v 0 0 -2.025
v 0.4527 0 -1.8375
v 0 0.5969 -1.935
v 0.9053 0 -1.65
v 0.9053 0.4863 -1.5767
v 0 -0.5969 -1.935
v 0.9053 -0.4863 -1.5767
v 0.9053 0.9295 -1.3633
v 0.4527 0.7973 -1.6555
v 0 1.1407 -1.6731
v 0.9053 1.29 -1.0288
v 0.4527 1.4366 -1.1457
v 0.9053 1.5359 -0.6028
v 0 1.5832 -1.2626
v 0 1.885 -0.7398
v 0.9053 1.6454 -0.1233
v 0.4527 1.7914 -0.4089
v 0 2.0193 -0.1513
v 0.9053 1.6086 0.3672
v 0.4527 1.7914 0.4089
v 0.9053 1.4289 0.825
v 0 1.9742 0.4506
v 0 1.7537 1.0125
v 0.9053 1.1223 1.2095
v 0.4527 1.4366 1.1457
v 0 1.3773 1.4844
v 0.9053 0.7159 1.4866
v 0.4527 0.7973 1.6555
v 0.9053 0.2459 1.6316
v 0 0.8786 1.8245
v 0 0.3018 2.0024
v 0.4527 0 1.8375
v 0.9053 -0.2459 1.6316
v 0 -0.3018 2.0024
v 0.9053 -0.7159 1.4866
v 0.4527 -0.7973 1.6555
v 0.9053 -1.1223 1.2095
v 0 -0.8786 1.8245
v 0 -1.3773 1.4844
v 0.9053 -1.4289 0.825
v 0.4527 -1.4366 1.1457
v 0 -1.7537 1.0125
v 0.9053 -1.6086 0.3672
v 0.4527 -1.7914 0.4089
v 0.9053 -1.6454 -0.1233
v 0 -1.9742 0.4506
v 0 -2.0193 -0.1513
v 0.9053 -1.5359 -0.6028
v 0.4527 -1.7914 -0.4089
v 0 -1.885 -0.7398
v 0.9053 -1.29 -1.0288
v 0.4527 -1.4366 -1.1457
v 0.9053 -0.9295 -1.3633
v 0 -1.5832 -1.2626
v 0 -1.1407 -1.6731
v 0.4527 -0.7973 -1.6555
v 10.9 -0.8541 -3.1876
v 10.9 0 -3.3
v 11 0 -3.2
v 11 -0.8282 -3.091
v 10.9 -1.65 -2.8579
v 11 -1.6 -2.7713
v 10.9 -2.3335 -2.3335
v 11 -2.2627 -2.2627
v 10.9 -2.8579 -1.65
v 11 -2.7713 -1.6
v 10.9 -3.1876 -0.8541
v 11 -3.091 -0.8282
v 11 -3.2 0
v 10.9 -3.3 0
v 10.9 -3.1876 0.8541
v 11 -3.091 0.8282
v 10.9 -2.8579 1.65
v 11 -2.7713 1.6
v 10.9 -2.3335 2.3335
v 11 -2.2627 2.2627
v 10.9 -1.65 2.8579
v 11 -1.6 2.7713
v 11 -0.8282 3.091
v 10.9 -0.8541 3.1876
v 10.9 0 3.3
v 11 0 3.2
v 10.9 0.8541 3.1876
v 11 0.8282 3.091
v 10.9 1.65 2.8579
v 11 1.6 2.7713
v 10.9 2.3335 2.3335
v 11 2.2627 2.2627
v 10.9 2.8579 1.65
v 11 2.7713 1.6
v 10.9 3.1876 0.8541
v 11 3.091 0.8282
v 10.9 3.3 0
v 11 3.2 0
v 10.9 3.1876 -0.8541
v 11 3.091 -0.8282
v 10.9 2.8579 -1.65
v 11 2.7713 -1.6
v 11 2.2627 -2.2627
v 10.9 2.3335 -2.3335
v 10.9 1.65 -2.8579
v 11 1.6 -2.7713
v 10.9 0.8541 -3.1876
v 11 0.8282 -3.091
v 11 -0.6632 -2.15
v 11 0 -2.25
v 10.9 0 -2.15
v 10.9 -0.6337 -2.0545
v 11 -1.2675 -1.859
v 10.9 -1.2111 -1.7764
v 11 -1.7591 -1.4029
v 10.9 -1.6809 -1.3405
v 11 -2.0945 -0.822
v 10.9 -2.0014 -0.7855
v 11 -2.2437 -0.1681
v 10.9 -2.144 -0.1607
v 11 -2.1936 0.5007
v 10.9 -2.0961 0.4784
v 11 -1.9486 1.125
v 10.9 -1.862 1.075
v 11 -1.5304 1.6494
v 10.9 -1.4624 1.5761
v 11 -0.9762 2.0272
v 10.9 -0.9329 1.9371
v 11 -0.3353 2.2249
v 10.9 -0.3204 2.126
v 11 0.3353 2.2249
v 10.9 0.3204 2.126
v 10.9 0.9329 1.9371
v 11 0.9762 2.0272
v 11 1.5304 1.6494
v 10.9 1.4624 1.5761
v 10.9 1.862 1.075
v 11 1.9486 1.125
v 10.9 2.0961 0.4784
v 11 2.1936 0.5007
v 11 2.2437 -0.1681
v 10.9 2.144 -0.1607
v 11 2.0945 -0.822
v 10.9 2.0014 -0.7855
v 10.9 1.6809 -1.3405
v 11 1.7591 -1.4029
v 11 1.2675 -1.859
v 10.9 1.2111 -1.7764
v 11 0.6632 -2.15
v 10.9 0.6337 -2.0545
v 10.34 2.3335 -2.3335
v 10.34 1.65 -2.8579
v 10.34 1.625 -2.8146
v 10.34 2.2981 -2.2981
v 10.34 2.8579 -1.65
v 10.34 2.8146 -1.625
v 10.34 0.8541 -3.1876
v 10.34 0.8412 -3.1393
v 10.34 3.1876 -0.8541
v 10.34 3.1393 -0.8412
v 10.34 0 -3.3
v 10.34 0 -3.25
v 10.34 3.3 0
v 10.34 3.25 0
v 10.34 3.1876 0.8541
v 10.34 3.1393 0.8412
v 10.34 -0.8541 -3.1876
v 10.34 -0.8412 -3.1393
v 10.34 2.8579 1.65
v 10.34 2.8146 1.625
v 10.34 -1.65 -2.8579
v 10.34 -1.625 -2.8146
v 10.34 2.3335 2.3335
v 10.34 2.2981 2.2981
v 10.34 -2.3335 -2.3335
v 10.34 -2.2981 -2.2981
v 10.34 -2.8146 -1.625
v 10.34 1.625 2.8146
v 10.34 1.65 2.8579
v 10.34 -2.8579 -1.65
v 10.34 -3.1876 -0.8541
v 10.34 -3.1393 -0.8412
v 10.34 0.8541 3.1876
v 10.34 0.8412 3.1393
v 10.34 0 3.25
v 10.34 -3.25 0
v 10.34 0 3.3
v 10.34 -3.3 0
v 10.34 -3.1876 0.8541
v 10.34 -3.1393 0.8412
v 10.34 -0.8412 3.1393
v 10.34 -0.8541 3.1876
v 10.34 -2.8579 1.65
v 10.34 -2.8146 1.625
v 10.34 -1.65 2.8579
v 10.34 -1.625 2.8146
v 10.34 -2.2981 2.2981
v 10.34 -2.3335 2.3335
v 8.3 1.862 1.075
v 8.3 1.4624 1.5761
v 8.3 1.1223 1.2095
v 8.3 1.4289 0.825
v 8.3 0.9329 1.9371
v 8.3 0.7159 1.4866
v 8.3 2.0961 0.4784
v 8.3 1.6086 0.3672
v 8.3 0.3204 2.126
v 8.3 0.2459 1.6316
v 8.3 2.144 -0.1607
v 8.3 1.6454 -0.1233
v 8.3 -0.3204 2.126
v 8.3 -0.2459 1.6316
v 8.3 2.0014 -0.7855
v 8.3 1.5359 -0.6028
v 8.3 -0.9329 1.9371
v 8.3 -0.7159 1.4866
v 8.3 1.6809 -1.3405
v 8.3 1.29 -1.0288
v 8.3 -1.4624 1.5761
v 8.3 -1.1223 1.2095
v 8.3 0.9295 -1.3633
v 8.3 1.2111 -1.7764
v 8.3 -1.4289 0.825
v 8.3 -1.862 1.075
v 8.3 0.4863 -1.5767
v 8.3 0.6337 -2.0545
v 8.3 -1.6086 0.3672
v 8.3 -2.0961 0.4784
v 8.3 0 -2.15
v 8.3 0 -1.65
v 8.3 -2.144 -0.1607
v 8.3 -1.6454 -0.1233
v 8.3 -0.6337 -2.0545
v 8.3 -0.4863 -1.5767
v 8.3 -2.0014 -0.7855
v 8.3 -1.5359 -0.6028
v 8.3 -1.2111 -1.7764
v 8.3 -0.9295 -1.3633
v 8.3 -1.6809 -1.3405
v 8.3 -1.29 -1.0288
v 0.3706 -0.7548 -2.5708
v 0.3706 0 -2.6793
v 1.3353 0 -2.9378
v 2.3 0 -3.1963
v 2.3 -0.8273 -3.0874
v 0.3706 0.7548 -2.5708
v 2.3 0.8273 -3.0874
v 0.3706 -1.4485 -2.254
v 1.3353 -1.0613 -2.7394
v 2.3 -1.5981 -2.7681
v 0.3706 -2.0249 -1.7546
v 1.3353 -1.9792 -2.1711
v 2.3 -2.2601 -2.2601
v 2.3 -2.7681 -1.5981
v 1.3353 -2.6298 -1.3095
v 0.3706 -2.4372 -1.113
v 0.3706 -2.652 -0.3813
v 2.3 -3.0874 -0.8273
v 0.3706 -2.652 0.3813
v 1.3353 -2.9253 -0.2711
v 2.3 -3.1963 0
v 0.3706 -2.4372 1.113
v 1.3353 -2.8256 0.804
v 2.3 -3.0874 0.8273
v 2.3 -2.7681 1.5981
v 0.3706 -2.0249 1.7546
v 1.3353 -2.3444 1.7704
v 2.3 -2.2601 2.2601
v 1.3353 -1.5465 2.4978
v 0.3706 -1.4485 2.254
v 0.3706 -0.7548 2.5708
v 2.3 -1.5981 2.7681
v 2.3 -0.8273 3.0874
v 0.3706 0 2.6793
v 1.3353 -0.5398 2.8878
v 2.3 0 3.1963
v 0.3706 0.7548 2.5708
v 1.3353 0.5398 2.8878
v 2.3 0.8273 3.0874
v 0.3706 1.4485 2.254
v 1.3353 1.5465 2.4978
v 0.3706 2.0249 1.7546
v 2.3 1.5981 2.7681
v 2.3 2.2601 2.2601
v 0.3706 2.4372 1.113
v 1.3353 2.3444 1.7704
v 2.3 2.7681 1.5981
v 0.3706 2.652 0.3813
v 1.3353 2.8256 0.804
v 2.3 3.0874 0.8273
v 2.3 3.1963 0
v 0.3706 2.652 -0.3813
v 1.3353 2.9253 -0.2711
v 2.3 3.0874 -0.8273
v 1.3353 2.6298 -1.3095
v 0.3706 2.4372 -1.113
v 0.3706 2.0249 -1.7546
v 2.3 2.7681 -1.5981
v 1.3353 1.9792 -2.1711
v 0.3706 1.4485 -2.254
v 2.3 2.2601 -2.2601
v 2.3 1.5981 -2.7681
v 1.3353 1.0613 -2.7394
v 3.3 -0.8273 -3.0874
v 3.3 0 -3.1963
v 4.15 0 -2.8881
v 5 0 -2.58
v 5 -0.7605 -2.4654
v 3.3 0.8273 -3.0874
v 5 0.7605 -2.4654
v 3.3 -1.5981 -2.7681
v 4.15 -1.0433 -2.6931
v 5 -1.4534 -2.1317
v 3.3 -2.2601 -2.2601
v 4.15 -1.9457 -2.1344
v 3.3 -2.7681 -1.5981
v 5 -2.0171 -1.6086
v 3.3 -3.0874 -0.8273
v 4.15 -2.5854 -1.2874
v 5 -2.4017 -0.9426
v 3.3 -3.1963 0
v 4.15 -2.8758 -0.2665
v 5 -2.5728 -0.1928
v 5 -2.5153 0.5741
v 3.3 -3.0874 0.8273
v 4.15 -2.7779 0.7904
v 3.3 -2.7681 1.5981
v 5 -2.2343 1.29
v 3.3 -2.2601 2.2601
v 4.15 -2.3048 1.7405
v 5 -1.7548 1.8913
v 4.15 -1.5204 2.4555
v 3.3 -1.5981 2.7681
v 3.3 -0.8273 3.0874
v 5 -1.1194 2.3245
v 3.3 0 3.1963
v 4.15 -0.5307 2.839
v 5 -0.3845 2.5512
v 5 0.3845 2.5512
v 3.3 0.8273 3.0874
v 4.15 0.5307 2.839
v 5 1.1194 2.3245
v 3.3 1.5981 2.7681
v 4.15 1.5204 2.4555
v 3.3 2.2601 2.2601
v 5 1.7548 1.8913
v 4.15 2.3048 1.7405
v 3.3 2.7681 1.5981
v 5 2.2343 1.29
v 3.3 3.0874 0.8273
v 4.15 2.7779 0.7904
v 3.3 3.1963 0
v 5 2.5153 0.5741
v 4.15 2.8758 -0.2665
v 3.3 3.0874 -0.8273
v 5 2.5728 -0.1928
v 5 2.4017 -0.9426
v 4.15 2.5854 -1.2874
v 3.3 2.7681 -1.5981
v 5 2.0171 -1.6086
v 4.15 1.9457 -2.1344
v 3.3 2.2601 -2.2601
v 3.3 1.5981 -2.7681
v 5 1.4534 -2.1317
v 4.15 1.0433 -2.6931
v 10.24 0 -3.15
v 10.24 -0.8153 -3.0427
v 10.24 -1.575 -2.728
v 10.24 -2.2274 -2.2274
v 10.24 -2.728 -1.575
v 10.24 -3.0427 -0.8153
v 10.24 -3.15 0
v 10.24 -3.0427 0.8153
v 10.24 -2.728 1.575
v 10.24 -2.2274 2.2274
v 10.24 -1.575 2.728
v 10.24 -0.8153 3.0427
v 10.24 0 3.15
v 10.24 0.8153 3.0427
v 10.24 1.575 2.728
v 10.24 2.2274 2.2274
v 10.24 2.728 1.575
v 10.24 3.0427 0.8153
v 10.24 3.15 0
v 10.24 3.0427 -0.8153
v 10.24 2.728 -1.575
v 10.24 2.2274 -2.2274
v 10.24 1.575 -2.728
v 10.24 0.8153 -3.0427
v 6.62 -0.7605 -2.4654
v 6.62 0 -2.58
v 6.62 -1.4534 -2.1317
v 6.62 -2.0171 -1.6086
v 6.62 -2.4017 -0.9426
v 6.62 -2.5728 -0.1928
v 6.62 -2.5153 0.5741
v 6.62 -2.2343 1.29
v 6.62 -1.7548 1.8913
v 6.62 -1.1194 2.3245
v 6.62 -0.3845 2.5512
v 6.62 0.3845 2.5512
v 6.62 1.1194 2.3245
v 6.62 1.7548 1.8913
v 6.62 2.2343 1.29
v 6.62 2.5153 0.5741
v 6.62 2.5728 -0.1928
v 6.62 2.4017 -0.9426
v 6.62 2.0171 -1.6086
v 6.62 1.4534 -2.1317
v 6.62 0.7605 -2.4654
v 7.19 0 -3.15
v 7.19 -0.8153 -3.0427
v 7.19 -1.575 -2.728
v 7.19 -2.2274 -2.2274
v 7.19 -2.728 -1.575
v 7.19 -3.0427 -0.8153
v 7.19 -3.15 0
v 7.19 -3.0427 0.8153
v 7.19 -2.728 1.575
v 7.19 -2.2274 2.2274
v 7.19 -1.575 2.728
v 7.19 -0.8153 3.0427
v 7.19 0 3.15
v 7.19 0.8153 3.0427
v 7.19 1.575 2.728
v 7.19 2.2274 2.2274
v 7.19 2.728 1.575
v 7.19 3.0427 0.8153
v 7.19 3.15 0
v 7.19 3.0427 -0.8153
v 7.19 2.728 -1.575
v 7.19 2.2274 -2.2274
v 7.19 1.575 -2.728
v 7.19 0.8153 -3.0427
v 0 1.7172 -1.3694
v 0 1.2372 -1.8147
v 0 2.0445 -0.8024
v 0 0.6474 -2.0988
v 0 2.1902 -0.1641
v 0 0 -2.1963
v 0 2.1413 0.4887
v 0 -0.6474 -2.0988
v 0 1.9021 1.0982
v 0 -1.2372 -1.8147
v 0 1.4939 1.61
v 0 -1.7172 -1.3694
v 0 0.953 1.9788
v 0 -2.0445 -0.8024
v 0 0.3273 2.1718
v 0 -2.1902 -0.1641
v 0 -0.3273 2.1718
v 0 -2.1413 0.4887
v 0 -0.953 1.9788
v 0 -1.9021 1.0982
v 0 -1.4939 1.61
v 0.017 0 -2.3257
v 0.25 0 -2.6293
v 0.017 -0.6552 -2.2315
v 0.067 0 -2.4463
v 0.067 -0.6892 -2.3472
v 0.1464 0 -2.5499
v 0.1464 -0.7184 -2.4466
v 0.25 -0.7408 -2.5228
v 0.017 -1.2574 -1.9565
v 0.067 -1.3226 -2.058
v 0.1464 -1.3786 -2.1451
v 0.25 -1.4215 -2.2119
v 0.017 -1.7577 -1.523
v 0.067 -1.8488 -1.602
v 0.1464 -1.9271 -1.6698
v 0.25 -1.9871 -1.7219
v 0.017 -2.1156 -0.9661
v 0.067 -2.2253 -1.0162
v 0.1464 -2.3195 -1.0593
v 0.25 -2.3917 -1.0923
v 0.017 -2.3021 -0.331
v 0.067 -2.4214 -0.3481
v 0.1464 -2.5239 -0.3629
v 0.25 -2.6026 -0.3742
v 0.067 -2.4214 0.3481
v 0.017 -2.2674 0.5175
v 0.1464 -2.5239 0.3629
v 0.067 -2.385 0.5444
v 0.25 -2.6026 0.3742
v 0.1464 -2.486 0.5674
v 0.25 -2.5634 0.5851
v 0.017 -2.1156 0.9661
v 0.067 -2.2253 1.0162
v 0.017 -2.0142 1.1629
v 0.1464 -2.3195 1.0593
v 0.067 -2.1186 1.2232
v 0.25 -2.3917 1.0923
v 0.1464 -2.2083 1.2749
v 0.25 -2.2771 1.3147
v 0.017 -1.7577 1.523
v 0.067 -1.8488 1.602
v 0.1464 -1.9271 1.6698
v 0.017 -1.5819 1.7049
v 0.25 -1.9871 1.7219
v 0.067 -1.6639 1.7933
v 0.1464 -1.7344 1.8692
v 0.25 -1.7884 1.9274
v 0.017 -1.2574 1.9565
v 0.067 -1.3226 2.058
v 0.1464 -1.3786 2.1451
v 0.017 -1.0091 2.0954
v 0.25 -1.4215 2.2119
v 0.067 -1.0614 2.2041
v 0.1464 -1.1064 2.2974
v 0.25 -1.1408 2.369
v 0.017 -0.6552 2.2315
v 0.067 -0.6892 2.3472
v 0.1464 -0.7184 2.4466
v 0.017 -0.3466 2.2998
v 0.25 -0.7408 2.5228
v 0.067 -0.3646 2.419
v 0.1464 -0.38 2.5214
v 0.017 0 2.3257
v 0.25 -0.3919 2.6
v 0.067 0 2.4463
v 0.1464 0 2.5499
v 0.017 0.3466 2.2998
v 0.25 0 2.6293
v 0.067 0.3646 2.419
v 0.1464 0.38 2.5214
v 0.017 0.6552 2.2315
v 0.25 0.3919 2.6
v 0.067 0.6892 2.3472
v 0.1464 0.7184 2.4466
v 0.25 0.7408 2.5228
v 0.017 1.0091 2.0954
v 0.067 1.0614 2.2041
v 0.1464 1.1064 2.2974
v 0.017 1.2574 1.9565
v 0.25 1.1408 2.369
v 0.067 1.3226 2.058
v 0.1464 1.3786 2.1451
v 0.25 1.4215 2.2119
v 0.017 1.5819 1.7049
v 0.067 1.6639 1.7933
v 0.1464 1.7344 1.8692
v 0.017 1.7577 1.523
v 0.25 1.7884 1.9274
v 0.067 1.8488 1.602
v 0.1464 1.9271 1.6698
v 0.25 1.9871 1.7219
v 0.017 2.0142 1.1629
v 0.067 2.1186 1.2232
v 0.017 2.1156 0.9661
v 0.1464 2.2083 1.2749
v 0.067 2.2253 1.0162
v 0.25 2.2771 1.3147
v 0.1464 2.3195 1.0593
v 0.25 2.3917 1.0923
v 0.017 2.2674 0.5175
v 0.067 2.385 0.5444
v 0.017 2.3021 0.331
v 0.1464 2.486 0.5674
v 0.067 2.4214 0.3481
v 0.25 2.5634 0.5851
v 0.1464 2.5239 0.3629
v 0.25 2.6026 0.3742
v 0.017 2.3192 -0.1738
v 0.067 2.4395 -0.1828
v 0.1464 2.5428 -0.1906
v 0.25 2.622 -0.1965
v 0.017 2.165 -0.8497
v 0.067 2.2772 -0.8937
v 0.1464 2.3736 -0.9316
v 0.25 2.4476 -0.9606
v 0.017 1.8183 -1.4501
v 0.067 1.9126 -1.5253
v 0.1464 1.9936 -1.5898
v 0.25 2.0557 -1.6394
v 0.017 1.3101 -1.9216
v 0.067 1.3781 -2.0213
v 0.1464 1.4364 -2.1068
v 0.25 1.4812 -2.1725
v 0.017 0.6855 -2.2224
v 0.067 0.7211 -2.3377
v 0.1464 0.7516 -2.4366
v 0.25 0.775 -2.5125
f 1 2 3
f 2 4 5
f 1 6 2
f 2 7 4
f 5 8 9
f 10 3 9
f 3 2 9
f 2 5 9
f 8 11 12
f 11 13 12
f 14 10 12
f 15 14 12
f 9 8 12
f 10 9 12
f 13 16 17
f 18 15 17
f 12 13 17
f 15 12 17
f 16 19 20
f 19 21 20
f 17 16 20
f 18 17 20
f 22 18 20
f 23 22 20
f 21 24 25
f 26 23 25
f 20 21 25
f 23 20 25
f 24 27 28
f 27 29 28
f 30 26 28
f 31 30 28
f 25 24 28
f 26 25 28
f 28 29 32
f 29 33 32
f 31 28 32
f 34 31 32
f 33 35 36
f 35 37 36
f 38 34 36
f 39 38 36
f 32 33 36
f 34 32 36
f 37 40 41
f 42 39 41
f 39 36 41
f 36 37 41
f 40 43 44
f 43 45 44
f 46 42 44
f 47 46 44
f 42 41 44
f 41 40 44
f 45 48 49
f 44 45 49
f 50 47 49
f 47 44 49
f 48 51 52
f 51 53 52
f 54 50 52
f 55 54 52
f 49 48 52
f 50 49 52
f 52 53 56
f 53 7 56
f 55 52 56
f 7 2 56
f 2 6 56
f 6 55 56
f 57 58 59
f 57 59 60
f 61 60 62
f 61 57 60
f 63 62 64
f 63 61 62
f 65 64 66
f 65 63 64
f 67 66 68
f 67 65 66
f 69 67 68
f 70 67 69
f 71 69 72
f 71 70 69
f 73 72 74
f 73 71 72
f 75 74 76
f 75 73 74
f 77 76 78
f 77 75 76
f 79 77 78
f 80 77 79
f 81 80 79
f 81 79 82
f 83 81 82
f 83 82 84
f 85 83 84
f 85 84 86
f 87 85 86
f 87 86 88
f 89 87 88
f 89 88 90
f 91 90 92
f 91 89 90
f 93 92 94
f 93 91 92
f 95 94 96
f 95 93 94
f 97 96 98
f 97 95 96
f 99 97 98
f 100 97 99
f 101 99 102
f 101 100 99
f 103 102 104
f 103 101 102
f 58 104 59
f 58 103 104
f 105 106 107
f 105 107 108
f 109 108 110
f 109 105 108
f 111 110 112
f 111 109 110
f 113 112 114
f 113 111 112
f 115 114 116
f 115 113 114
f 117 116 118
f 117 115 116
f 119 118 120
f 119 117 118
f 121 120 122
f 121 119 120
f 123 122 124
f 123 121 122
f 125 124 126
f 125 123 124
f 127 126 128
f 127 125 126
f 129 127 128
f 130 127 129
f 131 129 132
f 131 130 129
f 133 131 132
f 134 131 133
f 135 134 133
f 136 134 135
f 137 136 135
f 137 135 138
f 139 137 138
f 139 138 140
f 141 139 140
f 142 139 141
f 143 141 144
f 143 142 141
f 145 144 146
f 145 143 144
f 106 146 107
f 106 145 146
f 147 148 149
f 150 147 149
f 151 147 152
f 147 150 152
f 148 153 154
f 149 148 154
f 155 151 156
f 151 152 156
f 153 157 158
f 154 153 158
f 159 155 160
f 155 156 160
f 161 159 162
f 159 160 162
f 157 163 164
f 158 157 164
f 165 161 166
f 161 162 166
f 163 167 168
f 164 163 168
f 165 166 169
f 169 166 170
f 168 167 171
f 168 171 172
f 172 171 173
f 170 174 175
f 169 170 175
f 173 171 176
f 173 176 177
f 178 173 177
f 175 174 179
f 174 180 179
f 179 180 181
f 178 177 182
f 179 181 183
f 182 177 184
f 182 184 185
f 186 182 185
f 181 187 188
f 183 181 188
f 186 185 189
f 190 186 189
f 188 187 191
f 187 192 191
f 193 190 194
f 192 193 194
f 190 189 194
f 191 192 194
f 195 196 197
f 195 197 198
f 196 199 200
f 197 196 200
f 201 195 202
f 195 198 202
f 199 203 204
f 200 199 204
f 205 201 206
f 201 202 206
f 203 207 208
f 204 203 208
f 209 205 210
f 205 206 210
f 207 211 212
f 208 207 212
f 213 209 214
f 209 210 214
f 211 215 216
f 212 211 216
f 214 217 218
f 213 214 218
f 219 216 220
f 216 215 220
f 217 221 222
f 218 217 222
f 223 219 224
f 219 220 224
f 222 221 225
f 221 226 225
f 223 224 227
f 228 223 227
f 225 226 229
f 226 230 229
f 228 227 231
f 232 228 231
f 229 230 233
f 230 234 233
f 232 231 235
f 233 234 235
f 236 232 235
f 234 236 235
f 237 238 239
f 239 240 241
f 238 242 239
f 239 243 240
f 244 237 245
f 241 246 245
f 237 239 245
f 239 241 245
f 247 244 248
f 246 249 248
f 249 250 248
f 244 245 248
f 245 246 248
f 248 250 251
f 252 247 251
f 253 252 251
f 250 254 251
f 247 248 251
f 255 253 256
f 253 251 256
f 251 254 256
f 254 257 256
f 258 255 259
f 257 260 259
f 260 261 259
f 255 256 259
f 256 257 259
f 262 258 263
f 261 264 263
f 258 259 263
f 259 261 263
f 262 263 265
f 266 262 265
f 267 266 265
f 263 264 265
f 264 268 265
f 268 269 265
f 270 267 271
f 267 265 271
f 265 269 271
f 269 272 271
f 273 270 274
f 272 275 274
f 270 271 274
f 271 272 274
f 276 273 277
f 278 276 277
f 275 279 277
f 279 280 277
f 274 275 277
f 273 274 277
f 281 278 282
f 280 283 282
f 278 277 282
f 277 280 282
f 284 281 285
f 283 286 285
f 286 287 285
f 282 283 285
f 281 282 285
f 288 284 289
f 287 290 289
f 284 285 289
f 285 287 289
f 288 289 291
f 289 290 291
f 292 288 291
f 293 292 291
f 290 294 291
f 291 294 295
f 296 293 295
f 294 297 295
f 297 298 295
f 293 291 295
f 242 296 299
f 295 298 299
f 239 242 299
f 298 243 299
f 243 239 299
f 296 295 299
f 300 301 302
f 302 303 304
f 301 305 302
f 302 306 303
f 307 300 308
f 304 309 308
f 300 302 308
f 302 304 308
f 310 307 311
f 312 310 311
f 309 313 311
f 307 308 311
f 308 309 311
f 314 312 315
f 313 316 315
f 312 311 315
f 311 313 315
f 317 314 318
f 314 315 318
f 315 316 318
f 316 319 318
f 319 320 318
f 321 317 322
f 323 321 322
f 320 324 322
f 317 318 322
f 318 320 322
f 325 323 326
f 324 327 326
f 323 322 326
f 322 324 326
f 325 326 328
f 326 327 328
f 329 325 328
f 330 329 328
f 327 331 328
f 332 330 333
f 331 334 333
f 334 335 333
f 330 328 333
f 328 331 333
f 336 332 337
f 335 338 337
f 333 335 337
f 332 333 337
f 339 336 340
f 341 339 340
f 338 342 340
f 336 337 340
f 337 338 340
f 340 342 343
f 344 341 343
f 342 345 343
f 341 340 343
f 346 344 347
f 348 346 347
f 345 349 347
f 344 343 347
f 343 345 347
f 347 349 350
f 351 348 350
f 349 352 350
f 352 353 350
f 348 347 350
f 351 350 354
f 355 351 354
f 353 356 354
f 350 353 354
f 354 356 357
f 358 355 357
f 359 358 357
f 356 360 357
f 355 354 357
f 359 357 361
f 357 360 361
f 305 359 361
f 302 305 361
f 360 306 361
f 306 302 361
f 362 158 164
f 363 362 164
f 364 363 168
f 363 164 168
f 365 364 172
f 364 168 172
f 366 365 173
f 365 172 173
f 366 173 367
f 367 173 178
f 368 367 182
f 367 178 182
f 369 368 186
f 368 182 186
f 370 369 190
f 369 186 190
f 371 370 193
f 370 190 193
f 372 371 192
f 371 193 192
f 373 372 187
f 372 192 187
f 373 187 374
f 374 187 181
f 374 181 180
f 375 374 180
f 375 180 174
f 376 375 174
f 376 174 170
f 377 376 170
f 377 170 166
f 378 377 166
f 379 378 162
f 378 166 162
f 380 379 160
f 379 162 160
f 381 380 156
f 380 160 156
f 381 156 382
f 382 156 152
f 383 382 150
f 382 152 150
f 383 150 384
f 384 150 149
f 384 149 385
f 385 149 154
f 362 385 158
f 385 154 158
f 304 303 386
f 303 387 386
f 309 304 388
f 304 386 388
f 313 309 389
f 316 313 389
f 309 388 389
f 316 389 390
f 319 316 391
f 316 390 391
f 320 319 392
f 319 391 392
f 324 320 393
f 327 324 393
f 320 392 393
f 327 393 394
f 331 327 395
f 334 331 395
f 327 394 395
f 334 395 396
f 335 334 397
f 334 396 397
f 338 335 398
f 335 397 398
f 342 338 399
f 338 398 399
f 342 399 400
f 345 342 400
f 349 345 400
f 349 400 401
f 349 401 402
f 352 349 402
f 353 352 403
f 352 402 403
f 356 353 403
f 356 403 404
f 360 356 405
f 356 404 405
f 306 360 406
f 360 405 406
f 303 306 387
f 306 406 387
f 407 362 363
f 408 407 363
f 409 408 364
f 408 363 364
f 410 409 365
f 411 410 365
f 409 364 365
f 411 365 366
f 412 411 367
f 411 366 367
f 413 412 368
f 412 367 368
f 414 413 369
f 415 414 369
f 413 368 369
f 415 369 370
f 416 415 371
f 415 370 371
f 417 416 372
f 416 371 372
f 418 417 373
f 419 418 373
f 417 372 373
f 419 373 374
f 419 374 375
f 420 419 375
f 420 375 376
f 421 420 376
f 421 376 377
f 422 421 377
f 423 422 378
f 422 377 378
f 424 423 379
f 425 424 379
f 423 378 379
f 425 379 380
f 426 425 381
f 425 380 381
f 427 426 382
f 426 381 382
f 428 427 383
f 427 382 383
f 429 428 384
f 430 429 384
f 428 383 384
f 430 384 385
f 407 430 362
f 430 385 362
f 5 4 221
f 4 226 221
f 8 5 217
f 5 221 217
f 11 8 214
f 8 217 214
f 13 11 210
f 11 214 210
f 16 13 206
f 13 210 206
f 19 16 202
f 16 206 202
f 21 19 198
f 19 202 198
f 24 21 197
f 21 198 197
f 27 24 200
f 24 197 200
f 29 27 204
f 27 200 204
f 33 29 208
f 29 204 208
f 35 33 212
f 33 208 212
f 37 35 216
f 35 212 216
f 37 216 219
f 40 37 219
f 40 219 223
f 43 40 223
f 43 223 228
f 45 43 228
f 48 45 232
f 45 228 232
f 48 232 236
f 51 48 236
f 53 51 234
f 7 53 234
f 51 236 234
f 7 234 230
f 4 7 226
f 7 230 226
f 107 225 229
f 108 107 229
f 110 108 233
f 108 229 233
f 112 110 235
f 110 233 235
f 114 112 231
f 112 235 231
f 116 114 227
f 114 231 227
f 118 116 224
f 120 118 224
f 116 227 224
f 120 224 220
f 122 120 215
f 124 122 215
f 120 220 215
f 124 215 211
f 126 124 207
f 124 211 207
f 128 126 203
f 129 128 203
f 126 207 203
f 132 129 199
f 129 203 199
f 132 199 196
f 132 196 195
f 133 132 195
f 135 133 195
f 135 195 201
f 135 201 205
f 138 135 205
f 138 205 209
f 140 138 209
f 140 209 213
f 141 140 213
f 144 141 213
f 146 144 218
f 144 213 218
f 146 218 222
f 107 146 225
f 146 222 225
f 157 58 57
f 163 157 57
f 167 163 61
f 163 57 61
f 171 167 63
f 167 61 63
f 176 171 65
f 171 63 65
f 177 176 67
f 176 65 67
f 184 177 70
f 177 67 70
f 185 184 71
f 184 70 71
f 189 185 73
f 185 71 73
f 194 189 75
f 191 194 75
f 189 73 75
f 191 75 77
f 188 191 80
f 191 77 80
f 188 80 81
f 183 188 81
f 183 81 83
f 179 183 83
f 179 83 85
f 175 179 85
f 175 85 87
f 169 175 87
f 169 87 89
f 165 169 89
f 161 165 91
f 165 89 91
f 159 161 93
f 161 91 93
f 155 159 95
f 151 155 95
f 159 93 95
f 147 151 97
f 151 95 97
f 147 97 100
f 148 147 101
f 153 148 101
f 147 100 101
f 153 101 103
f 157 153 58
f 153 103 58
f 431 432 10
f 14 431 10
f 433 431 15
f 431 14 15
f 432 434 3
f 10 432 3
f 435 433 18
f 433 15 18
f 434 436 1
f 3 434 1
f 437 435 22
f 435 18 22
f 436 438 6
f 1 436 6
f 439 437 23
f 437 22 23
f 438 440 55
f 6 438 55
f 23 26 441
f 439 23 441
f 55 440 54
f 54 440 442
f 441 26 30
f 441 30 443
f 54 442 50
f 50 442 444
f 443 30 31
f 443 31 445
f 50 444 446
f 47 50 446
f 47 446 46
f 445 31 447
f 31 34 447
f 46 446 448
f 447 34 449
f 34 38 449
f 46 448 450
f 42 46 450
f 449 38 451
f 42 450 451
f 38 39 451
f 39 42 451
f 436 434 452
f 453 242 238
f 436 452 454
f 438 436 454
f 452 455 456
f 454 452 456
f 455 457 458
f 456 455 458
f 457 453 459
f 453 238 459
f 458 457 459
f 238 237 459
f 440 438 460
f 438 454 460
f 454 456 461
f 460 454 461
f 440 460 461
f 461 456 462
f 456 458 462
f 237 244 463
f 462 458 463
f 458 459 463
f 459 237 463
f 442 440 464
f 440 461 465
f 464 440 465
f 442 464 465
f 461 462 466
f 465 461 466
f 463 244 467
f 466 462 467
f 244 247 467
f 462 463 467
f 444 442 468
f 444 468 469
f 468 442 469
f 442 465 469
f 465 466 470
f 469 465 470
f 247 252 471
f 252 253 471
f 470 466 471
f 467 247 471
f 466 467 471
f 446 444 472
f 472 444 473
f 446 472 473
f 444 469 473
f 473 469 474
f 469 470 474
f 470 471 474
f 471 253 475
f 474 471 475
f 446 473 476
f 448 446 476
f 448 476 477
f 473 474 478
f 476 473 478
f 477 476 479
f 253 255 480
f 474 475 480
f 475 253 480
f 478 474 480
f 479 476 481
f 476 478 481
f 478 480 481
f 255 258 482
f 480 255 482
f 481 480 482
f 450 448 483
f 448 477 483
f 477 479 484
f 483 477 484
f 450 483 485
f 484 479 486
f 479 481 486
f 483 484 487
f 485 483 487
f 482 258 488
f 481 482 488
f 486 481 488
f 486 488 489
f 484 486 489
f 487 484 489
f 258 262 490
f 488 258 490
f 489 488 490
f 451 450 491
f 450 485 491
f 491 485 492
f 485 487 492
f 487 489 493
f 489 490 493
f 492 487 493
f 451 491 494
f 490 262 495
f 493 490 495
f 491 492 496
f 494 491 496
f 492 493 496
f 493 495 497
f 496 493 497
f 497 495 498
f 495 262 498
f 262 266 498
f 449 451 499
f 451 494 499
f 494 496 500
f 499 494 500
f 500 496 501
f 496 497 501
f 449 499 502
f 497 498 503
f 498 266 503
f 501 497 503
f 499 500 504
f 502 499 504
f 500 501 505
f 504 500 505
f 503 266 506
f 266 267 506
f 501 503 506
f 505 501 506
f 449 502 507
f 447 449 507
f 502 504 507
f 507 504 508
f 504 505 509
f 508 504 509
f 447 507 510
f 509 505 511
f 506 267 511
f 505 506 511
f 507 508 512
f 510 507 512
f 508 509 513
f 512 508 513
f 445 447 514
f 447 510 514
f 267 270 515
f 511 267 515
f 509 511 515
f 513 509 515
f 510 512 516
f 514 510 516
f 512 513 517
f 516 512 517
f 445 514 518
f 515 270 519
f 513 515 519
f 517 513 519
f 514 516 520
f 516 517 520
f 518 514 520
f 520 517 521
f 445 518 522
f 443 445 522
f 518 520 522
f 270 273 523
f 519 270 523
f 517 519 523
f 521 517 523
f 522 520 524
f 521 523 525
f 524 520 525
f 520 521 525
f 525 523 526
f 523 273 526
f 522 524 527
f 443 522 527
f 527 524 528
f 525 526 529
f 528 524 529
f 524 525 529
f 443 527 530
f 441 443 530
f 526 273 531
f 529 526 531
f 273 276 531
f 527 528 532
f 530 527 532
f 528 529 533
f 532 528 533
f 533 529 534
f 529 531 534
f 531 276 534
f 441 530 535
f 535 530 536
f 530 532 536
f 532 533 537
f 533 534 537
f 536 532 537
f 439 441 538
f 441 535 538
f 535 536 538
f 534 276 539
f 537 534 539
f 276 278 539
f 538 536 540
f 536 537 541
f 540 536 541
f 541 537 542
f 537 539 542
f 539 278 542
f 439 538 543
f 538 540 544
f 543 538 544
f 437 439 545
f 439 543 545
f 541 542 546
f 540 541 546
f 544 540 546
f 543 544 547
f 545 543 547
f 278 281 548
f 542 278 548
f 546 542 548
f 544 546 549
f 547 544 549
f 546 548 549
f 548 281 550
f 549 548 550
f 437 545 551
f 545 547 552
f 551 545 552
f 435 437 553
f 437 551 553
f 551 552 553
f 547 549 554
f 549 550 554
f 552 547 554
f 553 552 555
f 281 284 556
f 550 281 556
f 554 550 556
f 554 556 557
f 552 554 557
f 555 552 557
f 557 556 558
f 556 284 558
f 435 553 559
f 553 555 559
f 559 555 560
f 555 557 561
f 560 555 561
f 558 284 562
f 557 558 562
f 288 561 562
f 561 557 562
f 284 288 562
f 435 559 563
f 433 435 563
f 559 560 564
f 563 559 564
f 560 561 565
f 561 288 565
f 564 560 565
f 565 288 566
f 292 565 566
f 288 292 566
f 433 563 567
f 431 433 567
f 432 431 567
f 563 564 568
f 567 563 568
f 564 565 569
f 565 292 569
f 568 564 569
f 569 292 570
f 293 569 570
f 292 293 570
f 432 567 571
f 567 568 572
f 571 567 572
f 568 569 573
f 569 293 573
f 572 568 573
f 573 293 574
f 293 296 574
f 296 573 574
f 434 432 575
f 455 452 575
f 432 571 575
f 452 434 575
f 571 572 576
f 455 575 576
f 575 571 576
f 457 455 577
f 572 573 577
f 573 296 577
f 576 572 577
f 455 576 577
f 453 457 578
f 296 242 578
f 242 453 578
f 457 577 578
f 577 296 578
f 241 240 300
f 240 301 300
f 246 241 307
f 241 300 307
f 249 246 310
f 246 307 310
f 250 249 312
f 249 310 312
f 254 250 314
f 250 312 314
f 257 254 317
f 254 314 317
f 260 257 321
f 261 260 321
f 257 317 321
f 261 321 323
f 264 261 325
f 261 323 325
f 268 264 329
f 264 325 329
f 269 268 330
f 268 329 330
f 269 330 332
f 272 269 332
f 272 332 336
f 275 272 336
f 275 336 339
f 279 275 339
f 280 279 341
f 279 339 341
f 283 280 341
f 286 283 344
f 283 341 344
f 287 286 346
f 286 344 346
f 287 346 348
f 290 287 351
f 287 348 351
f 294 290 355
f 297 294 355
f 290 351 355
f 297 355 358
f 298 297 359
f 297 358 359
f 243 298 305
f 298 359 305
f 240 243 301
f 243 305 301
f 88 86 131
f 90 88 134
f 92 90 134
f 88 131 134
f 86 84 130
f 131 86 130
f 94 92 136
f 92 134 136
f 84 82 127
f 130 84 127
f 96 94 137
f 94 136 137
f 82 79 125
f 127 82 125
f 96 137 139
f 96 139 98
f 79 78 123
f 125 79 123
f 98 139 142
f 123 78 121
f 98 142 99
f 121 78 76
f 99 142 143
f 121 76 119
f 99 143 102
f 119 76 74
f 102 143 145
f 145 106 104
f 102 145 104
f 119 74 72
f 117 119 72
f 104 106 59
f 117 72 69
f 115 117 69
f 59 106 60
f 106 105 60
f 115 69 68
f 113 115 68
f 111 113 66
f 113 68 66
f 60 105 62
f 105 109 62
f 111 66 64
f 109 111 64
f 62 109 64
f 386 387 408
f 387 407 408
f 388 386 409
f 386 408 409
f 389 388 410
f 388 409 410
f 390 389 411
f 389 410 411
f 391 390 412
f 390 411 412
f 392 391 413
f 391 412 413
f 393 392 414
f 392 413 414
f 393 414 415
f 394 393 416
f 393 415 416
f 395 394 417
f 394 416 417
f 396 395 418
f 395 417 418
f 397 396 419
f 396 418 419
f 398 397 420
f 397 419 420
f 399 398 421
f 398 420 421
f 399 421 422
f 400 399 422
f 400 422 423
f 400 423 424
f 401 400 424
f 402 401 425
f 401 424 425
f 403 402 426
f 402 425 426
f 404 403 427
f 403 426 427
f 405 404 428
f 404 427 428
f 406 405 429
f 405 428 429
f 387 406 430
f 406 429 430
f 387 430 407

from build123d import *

# Parameters (mm, degrees)
M4_TAPPED_HOLE1_D           = 3.3
M4_TAPPED_HOLE1_CSINK_D     = 4.05
M4_TAPPED_HOLE1_CSINK_ANGLE = 45
FILLET1_R                   = 0.5
CHAMFER1_SIZE               = 0.1


with BuildPart() as part:
    # Sketch1 → Revolve1 (revolve)
    with BuildSketch(Plane.XY, mode=Mode.PRIVATE) as revolve1_sk:
        Polygon((5.889590125, 0), (0, 0), (0, 2.58), (2.3, 3.196283143), (3.3, 3.196283143), (5, 2.58), (6.62, 2.58), (7.19, 3.15), (10.34, 3.15), (10.34, 3.3), (11, 3.3), (11, 2.15), (8.3, 2.15), (8.3, 0), align=None)
    revolve(revolve1_sk.sketch.rotate(Axis((5.889590125, 0, 0), (-1, 0, 0)), 90), axis=Axis((5.889590125, 0, 0), (-1, 0, 0)))

    # M4 Tapped Hole1 (through all)
    with Locations(Plane.ZY):
        with Locations((0, 0)):
            CounterSinkHole(M4_TAPPED_HOLE1_D / 2, M4_TAPPED_HOLE1_CSINK_D / 2, counter_sink_angle=M4_TAPPED_HOLE1_CSINK_ANGLE)

    # Fillet1
    fillet1_edges = [part.edges().sort_by_distance(p)[0] for p in [
        (0, 0, 2.58),
    ]]
    fillet(fillet1_edges, radius=FILLET1_R)

    # Chamfer1
    chamfer1_edges = [part.edges().sort_by_distance(p)[0] for p in [
        (11, 0, 2.15),
        (11, 0, 3.3),
        (10.34, 0, 3.15),
    ]]
    chamfer(chamfer1_edges, length=CHAMFER1_SIZE)


solid = part.part
